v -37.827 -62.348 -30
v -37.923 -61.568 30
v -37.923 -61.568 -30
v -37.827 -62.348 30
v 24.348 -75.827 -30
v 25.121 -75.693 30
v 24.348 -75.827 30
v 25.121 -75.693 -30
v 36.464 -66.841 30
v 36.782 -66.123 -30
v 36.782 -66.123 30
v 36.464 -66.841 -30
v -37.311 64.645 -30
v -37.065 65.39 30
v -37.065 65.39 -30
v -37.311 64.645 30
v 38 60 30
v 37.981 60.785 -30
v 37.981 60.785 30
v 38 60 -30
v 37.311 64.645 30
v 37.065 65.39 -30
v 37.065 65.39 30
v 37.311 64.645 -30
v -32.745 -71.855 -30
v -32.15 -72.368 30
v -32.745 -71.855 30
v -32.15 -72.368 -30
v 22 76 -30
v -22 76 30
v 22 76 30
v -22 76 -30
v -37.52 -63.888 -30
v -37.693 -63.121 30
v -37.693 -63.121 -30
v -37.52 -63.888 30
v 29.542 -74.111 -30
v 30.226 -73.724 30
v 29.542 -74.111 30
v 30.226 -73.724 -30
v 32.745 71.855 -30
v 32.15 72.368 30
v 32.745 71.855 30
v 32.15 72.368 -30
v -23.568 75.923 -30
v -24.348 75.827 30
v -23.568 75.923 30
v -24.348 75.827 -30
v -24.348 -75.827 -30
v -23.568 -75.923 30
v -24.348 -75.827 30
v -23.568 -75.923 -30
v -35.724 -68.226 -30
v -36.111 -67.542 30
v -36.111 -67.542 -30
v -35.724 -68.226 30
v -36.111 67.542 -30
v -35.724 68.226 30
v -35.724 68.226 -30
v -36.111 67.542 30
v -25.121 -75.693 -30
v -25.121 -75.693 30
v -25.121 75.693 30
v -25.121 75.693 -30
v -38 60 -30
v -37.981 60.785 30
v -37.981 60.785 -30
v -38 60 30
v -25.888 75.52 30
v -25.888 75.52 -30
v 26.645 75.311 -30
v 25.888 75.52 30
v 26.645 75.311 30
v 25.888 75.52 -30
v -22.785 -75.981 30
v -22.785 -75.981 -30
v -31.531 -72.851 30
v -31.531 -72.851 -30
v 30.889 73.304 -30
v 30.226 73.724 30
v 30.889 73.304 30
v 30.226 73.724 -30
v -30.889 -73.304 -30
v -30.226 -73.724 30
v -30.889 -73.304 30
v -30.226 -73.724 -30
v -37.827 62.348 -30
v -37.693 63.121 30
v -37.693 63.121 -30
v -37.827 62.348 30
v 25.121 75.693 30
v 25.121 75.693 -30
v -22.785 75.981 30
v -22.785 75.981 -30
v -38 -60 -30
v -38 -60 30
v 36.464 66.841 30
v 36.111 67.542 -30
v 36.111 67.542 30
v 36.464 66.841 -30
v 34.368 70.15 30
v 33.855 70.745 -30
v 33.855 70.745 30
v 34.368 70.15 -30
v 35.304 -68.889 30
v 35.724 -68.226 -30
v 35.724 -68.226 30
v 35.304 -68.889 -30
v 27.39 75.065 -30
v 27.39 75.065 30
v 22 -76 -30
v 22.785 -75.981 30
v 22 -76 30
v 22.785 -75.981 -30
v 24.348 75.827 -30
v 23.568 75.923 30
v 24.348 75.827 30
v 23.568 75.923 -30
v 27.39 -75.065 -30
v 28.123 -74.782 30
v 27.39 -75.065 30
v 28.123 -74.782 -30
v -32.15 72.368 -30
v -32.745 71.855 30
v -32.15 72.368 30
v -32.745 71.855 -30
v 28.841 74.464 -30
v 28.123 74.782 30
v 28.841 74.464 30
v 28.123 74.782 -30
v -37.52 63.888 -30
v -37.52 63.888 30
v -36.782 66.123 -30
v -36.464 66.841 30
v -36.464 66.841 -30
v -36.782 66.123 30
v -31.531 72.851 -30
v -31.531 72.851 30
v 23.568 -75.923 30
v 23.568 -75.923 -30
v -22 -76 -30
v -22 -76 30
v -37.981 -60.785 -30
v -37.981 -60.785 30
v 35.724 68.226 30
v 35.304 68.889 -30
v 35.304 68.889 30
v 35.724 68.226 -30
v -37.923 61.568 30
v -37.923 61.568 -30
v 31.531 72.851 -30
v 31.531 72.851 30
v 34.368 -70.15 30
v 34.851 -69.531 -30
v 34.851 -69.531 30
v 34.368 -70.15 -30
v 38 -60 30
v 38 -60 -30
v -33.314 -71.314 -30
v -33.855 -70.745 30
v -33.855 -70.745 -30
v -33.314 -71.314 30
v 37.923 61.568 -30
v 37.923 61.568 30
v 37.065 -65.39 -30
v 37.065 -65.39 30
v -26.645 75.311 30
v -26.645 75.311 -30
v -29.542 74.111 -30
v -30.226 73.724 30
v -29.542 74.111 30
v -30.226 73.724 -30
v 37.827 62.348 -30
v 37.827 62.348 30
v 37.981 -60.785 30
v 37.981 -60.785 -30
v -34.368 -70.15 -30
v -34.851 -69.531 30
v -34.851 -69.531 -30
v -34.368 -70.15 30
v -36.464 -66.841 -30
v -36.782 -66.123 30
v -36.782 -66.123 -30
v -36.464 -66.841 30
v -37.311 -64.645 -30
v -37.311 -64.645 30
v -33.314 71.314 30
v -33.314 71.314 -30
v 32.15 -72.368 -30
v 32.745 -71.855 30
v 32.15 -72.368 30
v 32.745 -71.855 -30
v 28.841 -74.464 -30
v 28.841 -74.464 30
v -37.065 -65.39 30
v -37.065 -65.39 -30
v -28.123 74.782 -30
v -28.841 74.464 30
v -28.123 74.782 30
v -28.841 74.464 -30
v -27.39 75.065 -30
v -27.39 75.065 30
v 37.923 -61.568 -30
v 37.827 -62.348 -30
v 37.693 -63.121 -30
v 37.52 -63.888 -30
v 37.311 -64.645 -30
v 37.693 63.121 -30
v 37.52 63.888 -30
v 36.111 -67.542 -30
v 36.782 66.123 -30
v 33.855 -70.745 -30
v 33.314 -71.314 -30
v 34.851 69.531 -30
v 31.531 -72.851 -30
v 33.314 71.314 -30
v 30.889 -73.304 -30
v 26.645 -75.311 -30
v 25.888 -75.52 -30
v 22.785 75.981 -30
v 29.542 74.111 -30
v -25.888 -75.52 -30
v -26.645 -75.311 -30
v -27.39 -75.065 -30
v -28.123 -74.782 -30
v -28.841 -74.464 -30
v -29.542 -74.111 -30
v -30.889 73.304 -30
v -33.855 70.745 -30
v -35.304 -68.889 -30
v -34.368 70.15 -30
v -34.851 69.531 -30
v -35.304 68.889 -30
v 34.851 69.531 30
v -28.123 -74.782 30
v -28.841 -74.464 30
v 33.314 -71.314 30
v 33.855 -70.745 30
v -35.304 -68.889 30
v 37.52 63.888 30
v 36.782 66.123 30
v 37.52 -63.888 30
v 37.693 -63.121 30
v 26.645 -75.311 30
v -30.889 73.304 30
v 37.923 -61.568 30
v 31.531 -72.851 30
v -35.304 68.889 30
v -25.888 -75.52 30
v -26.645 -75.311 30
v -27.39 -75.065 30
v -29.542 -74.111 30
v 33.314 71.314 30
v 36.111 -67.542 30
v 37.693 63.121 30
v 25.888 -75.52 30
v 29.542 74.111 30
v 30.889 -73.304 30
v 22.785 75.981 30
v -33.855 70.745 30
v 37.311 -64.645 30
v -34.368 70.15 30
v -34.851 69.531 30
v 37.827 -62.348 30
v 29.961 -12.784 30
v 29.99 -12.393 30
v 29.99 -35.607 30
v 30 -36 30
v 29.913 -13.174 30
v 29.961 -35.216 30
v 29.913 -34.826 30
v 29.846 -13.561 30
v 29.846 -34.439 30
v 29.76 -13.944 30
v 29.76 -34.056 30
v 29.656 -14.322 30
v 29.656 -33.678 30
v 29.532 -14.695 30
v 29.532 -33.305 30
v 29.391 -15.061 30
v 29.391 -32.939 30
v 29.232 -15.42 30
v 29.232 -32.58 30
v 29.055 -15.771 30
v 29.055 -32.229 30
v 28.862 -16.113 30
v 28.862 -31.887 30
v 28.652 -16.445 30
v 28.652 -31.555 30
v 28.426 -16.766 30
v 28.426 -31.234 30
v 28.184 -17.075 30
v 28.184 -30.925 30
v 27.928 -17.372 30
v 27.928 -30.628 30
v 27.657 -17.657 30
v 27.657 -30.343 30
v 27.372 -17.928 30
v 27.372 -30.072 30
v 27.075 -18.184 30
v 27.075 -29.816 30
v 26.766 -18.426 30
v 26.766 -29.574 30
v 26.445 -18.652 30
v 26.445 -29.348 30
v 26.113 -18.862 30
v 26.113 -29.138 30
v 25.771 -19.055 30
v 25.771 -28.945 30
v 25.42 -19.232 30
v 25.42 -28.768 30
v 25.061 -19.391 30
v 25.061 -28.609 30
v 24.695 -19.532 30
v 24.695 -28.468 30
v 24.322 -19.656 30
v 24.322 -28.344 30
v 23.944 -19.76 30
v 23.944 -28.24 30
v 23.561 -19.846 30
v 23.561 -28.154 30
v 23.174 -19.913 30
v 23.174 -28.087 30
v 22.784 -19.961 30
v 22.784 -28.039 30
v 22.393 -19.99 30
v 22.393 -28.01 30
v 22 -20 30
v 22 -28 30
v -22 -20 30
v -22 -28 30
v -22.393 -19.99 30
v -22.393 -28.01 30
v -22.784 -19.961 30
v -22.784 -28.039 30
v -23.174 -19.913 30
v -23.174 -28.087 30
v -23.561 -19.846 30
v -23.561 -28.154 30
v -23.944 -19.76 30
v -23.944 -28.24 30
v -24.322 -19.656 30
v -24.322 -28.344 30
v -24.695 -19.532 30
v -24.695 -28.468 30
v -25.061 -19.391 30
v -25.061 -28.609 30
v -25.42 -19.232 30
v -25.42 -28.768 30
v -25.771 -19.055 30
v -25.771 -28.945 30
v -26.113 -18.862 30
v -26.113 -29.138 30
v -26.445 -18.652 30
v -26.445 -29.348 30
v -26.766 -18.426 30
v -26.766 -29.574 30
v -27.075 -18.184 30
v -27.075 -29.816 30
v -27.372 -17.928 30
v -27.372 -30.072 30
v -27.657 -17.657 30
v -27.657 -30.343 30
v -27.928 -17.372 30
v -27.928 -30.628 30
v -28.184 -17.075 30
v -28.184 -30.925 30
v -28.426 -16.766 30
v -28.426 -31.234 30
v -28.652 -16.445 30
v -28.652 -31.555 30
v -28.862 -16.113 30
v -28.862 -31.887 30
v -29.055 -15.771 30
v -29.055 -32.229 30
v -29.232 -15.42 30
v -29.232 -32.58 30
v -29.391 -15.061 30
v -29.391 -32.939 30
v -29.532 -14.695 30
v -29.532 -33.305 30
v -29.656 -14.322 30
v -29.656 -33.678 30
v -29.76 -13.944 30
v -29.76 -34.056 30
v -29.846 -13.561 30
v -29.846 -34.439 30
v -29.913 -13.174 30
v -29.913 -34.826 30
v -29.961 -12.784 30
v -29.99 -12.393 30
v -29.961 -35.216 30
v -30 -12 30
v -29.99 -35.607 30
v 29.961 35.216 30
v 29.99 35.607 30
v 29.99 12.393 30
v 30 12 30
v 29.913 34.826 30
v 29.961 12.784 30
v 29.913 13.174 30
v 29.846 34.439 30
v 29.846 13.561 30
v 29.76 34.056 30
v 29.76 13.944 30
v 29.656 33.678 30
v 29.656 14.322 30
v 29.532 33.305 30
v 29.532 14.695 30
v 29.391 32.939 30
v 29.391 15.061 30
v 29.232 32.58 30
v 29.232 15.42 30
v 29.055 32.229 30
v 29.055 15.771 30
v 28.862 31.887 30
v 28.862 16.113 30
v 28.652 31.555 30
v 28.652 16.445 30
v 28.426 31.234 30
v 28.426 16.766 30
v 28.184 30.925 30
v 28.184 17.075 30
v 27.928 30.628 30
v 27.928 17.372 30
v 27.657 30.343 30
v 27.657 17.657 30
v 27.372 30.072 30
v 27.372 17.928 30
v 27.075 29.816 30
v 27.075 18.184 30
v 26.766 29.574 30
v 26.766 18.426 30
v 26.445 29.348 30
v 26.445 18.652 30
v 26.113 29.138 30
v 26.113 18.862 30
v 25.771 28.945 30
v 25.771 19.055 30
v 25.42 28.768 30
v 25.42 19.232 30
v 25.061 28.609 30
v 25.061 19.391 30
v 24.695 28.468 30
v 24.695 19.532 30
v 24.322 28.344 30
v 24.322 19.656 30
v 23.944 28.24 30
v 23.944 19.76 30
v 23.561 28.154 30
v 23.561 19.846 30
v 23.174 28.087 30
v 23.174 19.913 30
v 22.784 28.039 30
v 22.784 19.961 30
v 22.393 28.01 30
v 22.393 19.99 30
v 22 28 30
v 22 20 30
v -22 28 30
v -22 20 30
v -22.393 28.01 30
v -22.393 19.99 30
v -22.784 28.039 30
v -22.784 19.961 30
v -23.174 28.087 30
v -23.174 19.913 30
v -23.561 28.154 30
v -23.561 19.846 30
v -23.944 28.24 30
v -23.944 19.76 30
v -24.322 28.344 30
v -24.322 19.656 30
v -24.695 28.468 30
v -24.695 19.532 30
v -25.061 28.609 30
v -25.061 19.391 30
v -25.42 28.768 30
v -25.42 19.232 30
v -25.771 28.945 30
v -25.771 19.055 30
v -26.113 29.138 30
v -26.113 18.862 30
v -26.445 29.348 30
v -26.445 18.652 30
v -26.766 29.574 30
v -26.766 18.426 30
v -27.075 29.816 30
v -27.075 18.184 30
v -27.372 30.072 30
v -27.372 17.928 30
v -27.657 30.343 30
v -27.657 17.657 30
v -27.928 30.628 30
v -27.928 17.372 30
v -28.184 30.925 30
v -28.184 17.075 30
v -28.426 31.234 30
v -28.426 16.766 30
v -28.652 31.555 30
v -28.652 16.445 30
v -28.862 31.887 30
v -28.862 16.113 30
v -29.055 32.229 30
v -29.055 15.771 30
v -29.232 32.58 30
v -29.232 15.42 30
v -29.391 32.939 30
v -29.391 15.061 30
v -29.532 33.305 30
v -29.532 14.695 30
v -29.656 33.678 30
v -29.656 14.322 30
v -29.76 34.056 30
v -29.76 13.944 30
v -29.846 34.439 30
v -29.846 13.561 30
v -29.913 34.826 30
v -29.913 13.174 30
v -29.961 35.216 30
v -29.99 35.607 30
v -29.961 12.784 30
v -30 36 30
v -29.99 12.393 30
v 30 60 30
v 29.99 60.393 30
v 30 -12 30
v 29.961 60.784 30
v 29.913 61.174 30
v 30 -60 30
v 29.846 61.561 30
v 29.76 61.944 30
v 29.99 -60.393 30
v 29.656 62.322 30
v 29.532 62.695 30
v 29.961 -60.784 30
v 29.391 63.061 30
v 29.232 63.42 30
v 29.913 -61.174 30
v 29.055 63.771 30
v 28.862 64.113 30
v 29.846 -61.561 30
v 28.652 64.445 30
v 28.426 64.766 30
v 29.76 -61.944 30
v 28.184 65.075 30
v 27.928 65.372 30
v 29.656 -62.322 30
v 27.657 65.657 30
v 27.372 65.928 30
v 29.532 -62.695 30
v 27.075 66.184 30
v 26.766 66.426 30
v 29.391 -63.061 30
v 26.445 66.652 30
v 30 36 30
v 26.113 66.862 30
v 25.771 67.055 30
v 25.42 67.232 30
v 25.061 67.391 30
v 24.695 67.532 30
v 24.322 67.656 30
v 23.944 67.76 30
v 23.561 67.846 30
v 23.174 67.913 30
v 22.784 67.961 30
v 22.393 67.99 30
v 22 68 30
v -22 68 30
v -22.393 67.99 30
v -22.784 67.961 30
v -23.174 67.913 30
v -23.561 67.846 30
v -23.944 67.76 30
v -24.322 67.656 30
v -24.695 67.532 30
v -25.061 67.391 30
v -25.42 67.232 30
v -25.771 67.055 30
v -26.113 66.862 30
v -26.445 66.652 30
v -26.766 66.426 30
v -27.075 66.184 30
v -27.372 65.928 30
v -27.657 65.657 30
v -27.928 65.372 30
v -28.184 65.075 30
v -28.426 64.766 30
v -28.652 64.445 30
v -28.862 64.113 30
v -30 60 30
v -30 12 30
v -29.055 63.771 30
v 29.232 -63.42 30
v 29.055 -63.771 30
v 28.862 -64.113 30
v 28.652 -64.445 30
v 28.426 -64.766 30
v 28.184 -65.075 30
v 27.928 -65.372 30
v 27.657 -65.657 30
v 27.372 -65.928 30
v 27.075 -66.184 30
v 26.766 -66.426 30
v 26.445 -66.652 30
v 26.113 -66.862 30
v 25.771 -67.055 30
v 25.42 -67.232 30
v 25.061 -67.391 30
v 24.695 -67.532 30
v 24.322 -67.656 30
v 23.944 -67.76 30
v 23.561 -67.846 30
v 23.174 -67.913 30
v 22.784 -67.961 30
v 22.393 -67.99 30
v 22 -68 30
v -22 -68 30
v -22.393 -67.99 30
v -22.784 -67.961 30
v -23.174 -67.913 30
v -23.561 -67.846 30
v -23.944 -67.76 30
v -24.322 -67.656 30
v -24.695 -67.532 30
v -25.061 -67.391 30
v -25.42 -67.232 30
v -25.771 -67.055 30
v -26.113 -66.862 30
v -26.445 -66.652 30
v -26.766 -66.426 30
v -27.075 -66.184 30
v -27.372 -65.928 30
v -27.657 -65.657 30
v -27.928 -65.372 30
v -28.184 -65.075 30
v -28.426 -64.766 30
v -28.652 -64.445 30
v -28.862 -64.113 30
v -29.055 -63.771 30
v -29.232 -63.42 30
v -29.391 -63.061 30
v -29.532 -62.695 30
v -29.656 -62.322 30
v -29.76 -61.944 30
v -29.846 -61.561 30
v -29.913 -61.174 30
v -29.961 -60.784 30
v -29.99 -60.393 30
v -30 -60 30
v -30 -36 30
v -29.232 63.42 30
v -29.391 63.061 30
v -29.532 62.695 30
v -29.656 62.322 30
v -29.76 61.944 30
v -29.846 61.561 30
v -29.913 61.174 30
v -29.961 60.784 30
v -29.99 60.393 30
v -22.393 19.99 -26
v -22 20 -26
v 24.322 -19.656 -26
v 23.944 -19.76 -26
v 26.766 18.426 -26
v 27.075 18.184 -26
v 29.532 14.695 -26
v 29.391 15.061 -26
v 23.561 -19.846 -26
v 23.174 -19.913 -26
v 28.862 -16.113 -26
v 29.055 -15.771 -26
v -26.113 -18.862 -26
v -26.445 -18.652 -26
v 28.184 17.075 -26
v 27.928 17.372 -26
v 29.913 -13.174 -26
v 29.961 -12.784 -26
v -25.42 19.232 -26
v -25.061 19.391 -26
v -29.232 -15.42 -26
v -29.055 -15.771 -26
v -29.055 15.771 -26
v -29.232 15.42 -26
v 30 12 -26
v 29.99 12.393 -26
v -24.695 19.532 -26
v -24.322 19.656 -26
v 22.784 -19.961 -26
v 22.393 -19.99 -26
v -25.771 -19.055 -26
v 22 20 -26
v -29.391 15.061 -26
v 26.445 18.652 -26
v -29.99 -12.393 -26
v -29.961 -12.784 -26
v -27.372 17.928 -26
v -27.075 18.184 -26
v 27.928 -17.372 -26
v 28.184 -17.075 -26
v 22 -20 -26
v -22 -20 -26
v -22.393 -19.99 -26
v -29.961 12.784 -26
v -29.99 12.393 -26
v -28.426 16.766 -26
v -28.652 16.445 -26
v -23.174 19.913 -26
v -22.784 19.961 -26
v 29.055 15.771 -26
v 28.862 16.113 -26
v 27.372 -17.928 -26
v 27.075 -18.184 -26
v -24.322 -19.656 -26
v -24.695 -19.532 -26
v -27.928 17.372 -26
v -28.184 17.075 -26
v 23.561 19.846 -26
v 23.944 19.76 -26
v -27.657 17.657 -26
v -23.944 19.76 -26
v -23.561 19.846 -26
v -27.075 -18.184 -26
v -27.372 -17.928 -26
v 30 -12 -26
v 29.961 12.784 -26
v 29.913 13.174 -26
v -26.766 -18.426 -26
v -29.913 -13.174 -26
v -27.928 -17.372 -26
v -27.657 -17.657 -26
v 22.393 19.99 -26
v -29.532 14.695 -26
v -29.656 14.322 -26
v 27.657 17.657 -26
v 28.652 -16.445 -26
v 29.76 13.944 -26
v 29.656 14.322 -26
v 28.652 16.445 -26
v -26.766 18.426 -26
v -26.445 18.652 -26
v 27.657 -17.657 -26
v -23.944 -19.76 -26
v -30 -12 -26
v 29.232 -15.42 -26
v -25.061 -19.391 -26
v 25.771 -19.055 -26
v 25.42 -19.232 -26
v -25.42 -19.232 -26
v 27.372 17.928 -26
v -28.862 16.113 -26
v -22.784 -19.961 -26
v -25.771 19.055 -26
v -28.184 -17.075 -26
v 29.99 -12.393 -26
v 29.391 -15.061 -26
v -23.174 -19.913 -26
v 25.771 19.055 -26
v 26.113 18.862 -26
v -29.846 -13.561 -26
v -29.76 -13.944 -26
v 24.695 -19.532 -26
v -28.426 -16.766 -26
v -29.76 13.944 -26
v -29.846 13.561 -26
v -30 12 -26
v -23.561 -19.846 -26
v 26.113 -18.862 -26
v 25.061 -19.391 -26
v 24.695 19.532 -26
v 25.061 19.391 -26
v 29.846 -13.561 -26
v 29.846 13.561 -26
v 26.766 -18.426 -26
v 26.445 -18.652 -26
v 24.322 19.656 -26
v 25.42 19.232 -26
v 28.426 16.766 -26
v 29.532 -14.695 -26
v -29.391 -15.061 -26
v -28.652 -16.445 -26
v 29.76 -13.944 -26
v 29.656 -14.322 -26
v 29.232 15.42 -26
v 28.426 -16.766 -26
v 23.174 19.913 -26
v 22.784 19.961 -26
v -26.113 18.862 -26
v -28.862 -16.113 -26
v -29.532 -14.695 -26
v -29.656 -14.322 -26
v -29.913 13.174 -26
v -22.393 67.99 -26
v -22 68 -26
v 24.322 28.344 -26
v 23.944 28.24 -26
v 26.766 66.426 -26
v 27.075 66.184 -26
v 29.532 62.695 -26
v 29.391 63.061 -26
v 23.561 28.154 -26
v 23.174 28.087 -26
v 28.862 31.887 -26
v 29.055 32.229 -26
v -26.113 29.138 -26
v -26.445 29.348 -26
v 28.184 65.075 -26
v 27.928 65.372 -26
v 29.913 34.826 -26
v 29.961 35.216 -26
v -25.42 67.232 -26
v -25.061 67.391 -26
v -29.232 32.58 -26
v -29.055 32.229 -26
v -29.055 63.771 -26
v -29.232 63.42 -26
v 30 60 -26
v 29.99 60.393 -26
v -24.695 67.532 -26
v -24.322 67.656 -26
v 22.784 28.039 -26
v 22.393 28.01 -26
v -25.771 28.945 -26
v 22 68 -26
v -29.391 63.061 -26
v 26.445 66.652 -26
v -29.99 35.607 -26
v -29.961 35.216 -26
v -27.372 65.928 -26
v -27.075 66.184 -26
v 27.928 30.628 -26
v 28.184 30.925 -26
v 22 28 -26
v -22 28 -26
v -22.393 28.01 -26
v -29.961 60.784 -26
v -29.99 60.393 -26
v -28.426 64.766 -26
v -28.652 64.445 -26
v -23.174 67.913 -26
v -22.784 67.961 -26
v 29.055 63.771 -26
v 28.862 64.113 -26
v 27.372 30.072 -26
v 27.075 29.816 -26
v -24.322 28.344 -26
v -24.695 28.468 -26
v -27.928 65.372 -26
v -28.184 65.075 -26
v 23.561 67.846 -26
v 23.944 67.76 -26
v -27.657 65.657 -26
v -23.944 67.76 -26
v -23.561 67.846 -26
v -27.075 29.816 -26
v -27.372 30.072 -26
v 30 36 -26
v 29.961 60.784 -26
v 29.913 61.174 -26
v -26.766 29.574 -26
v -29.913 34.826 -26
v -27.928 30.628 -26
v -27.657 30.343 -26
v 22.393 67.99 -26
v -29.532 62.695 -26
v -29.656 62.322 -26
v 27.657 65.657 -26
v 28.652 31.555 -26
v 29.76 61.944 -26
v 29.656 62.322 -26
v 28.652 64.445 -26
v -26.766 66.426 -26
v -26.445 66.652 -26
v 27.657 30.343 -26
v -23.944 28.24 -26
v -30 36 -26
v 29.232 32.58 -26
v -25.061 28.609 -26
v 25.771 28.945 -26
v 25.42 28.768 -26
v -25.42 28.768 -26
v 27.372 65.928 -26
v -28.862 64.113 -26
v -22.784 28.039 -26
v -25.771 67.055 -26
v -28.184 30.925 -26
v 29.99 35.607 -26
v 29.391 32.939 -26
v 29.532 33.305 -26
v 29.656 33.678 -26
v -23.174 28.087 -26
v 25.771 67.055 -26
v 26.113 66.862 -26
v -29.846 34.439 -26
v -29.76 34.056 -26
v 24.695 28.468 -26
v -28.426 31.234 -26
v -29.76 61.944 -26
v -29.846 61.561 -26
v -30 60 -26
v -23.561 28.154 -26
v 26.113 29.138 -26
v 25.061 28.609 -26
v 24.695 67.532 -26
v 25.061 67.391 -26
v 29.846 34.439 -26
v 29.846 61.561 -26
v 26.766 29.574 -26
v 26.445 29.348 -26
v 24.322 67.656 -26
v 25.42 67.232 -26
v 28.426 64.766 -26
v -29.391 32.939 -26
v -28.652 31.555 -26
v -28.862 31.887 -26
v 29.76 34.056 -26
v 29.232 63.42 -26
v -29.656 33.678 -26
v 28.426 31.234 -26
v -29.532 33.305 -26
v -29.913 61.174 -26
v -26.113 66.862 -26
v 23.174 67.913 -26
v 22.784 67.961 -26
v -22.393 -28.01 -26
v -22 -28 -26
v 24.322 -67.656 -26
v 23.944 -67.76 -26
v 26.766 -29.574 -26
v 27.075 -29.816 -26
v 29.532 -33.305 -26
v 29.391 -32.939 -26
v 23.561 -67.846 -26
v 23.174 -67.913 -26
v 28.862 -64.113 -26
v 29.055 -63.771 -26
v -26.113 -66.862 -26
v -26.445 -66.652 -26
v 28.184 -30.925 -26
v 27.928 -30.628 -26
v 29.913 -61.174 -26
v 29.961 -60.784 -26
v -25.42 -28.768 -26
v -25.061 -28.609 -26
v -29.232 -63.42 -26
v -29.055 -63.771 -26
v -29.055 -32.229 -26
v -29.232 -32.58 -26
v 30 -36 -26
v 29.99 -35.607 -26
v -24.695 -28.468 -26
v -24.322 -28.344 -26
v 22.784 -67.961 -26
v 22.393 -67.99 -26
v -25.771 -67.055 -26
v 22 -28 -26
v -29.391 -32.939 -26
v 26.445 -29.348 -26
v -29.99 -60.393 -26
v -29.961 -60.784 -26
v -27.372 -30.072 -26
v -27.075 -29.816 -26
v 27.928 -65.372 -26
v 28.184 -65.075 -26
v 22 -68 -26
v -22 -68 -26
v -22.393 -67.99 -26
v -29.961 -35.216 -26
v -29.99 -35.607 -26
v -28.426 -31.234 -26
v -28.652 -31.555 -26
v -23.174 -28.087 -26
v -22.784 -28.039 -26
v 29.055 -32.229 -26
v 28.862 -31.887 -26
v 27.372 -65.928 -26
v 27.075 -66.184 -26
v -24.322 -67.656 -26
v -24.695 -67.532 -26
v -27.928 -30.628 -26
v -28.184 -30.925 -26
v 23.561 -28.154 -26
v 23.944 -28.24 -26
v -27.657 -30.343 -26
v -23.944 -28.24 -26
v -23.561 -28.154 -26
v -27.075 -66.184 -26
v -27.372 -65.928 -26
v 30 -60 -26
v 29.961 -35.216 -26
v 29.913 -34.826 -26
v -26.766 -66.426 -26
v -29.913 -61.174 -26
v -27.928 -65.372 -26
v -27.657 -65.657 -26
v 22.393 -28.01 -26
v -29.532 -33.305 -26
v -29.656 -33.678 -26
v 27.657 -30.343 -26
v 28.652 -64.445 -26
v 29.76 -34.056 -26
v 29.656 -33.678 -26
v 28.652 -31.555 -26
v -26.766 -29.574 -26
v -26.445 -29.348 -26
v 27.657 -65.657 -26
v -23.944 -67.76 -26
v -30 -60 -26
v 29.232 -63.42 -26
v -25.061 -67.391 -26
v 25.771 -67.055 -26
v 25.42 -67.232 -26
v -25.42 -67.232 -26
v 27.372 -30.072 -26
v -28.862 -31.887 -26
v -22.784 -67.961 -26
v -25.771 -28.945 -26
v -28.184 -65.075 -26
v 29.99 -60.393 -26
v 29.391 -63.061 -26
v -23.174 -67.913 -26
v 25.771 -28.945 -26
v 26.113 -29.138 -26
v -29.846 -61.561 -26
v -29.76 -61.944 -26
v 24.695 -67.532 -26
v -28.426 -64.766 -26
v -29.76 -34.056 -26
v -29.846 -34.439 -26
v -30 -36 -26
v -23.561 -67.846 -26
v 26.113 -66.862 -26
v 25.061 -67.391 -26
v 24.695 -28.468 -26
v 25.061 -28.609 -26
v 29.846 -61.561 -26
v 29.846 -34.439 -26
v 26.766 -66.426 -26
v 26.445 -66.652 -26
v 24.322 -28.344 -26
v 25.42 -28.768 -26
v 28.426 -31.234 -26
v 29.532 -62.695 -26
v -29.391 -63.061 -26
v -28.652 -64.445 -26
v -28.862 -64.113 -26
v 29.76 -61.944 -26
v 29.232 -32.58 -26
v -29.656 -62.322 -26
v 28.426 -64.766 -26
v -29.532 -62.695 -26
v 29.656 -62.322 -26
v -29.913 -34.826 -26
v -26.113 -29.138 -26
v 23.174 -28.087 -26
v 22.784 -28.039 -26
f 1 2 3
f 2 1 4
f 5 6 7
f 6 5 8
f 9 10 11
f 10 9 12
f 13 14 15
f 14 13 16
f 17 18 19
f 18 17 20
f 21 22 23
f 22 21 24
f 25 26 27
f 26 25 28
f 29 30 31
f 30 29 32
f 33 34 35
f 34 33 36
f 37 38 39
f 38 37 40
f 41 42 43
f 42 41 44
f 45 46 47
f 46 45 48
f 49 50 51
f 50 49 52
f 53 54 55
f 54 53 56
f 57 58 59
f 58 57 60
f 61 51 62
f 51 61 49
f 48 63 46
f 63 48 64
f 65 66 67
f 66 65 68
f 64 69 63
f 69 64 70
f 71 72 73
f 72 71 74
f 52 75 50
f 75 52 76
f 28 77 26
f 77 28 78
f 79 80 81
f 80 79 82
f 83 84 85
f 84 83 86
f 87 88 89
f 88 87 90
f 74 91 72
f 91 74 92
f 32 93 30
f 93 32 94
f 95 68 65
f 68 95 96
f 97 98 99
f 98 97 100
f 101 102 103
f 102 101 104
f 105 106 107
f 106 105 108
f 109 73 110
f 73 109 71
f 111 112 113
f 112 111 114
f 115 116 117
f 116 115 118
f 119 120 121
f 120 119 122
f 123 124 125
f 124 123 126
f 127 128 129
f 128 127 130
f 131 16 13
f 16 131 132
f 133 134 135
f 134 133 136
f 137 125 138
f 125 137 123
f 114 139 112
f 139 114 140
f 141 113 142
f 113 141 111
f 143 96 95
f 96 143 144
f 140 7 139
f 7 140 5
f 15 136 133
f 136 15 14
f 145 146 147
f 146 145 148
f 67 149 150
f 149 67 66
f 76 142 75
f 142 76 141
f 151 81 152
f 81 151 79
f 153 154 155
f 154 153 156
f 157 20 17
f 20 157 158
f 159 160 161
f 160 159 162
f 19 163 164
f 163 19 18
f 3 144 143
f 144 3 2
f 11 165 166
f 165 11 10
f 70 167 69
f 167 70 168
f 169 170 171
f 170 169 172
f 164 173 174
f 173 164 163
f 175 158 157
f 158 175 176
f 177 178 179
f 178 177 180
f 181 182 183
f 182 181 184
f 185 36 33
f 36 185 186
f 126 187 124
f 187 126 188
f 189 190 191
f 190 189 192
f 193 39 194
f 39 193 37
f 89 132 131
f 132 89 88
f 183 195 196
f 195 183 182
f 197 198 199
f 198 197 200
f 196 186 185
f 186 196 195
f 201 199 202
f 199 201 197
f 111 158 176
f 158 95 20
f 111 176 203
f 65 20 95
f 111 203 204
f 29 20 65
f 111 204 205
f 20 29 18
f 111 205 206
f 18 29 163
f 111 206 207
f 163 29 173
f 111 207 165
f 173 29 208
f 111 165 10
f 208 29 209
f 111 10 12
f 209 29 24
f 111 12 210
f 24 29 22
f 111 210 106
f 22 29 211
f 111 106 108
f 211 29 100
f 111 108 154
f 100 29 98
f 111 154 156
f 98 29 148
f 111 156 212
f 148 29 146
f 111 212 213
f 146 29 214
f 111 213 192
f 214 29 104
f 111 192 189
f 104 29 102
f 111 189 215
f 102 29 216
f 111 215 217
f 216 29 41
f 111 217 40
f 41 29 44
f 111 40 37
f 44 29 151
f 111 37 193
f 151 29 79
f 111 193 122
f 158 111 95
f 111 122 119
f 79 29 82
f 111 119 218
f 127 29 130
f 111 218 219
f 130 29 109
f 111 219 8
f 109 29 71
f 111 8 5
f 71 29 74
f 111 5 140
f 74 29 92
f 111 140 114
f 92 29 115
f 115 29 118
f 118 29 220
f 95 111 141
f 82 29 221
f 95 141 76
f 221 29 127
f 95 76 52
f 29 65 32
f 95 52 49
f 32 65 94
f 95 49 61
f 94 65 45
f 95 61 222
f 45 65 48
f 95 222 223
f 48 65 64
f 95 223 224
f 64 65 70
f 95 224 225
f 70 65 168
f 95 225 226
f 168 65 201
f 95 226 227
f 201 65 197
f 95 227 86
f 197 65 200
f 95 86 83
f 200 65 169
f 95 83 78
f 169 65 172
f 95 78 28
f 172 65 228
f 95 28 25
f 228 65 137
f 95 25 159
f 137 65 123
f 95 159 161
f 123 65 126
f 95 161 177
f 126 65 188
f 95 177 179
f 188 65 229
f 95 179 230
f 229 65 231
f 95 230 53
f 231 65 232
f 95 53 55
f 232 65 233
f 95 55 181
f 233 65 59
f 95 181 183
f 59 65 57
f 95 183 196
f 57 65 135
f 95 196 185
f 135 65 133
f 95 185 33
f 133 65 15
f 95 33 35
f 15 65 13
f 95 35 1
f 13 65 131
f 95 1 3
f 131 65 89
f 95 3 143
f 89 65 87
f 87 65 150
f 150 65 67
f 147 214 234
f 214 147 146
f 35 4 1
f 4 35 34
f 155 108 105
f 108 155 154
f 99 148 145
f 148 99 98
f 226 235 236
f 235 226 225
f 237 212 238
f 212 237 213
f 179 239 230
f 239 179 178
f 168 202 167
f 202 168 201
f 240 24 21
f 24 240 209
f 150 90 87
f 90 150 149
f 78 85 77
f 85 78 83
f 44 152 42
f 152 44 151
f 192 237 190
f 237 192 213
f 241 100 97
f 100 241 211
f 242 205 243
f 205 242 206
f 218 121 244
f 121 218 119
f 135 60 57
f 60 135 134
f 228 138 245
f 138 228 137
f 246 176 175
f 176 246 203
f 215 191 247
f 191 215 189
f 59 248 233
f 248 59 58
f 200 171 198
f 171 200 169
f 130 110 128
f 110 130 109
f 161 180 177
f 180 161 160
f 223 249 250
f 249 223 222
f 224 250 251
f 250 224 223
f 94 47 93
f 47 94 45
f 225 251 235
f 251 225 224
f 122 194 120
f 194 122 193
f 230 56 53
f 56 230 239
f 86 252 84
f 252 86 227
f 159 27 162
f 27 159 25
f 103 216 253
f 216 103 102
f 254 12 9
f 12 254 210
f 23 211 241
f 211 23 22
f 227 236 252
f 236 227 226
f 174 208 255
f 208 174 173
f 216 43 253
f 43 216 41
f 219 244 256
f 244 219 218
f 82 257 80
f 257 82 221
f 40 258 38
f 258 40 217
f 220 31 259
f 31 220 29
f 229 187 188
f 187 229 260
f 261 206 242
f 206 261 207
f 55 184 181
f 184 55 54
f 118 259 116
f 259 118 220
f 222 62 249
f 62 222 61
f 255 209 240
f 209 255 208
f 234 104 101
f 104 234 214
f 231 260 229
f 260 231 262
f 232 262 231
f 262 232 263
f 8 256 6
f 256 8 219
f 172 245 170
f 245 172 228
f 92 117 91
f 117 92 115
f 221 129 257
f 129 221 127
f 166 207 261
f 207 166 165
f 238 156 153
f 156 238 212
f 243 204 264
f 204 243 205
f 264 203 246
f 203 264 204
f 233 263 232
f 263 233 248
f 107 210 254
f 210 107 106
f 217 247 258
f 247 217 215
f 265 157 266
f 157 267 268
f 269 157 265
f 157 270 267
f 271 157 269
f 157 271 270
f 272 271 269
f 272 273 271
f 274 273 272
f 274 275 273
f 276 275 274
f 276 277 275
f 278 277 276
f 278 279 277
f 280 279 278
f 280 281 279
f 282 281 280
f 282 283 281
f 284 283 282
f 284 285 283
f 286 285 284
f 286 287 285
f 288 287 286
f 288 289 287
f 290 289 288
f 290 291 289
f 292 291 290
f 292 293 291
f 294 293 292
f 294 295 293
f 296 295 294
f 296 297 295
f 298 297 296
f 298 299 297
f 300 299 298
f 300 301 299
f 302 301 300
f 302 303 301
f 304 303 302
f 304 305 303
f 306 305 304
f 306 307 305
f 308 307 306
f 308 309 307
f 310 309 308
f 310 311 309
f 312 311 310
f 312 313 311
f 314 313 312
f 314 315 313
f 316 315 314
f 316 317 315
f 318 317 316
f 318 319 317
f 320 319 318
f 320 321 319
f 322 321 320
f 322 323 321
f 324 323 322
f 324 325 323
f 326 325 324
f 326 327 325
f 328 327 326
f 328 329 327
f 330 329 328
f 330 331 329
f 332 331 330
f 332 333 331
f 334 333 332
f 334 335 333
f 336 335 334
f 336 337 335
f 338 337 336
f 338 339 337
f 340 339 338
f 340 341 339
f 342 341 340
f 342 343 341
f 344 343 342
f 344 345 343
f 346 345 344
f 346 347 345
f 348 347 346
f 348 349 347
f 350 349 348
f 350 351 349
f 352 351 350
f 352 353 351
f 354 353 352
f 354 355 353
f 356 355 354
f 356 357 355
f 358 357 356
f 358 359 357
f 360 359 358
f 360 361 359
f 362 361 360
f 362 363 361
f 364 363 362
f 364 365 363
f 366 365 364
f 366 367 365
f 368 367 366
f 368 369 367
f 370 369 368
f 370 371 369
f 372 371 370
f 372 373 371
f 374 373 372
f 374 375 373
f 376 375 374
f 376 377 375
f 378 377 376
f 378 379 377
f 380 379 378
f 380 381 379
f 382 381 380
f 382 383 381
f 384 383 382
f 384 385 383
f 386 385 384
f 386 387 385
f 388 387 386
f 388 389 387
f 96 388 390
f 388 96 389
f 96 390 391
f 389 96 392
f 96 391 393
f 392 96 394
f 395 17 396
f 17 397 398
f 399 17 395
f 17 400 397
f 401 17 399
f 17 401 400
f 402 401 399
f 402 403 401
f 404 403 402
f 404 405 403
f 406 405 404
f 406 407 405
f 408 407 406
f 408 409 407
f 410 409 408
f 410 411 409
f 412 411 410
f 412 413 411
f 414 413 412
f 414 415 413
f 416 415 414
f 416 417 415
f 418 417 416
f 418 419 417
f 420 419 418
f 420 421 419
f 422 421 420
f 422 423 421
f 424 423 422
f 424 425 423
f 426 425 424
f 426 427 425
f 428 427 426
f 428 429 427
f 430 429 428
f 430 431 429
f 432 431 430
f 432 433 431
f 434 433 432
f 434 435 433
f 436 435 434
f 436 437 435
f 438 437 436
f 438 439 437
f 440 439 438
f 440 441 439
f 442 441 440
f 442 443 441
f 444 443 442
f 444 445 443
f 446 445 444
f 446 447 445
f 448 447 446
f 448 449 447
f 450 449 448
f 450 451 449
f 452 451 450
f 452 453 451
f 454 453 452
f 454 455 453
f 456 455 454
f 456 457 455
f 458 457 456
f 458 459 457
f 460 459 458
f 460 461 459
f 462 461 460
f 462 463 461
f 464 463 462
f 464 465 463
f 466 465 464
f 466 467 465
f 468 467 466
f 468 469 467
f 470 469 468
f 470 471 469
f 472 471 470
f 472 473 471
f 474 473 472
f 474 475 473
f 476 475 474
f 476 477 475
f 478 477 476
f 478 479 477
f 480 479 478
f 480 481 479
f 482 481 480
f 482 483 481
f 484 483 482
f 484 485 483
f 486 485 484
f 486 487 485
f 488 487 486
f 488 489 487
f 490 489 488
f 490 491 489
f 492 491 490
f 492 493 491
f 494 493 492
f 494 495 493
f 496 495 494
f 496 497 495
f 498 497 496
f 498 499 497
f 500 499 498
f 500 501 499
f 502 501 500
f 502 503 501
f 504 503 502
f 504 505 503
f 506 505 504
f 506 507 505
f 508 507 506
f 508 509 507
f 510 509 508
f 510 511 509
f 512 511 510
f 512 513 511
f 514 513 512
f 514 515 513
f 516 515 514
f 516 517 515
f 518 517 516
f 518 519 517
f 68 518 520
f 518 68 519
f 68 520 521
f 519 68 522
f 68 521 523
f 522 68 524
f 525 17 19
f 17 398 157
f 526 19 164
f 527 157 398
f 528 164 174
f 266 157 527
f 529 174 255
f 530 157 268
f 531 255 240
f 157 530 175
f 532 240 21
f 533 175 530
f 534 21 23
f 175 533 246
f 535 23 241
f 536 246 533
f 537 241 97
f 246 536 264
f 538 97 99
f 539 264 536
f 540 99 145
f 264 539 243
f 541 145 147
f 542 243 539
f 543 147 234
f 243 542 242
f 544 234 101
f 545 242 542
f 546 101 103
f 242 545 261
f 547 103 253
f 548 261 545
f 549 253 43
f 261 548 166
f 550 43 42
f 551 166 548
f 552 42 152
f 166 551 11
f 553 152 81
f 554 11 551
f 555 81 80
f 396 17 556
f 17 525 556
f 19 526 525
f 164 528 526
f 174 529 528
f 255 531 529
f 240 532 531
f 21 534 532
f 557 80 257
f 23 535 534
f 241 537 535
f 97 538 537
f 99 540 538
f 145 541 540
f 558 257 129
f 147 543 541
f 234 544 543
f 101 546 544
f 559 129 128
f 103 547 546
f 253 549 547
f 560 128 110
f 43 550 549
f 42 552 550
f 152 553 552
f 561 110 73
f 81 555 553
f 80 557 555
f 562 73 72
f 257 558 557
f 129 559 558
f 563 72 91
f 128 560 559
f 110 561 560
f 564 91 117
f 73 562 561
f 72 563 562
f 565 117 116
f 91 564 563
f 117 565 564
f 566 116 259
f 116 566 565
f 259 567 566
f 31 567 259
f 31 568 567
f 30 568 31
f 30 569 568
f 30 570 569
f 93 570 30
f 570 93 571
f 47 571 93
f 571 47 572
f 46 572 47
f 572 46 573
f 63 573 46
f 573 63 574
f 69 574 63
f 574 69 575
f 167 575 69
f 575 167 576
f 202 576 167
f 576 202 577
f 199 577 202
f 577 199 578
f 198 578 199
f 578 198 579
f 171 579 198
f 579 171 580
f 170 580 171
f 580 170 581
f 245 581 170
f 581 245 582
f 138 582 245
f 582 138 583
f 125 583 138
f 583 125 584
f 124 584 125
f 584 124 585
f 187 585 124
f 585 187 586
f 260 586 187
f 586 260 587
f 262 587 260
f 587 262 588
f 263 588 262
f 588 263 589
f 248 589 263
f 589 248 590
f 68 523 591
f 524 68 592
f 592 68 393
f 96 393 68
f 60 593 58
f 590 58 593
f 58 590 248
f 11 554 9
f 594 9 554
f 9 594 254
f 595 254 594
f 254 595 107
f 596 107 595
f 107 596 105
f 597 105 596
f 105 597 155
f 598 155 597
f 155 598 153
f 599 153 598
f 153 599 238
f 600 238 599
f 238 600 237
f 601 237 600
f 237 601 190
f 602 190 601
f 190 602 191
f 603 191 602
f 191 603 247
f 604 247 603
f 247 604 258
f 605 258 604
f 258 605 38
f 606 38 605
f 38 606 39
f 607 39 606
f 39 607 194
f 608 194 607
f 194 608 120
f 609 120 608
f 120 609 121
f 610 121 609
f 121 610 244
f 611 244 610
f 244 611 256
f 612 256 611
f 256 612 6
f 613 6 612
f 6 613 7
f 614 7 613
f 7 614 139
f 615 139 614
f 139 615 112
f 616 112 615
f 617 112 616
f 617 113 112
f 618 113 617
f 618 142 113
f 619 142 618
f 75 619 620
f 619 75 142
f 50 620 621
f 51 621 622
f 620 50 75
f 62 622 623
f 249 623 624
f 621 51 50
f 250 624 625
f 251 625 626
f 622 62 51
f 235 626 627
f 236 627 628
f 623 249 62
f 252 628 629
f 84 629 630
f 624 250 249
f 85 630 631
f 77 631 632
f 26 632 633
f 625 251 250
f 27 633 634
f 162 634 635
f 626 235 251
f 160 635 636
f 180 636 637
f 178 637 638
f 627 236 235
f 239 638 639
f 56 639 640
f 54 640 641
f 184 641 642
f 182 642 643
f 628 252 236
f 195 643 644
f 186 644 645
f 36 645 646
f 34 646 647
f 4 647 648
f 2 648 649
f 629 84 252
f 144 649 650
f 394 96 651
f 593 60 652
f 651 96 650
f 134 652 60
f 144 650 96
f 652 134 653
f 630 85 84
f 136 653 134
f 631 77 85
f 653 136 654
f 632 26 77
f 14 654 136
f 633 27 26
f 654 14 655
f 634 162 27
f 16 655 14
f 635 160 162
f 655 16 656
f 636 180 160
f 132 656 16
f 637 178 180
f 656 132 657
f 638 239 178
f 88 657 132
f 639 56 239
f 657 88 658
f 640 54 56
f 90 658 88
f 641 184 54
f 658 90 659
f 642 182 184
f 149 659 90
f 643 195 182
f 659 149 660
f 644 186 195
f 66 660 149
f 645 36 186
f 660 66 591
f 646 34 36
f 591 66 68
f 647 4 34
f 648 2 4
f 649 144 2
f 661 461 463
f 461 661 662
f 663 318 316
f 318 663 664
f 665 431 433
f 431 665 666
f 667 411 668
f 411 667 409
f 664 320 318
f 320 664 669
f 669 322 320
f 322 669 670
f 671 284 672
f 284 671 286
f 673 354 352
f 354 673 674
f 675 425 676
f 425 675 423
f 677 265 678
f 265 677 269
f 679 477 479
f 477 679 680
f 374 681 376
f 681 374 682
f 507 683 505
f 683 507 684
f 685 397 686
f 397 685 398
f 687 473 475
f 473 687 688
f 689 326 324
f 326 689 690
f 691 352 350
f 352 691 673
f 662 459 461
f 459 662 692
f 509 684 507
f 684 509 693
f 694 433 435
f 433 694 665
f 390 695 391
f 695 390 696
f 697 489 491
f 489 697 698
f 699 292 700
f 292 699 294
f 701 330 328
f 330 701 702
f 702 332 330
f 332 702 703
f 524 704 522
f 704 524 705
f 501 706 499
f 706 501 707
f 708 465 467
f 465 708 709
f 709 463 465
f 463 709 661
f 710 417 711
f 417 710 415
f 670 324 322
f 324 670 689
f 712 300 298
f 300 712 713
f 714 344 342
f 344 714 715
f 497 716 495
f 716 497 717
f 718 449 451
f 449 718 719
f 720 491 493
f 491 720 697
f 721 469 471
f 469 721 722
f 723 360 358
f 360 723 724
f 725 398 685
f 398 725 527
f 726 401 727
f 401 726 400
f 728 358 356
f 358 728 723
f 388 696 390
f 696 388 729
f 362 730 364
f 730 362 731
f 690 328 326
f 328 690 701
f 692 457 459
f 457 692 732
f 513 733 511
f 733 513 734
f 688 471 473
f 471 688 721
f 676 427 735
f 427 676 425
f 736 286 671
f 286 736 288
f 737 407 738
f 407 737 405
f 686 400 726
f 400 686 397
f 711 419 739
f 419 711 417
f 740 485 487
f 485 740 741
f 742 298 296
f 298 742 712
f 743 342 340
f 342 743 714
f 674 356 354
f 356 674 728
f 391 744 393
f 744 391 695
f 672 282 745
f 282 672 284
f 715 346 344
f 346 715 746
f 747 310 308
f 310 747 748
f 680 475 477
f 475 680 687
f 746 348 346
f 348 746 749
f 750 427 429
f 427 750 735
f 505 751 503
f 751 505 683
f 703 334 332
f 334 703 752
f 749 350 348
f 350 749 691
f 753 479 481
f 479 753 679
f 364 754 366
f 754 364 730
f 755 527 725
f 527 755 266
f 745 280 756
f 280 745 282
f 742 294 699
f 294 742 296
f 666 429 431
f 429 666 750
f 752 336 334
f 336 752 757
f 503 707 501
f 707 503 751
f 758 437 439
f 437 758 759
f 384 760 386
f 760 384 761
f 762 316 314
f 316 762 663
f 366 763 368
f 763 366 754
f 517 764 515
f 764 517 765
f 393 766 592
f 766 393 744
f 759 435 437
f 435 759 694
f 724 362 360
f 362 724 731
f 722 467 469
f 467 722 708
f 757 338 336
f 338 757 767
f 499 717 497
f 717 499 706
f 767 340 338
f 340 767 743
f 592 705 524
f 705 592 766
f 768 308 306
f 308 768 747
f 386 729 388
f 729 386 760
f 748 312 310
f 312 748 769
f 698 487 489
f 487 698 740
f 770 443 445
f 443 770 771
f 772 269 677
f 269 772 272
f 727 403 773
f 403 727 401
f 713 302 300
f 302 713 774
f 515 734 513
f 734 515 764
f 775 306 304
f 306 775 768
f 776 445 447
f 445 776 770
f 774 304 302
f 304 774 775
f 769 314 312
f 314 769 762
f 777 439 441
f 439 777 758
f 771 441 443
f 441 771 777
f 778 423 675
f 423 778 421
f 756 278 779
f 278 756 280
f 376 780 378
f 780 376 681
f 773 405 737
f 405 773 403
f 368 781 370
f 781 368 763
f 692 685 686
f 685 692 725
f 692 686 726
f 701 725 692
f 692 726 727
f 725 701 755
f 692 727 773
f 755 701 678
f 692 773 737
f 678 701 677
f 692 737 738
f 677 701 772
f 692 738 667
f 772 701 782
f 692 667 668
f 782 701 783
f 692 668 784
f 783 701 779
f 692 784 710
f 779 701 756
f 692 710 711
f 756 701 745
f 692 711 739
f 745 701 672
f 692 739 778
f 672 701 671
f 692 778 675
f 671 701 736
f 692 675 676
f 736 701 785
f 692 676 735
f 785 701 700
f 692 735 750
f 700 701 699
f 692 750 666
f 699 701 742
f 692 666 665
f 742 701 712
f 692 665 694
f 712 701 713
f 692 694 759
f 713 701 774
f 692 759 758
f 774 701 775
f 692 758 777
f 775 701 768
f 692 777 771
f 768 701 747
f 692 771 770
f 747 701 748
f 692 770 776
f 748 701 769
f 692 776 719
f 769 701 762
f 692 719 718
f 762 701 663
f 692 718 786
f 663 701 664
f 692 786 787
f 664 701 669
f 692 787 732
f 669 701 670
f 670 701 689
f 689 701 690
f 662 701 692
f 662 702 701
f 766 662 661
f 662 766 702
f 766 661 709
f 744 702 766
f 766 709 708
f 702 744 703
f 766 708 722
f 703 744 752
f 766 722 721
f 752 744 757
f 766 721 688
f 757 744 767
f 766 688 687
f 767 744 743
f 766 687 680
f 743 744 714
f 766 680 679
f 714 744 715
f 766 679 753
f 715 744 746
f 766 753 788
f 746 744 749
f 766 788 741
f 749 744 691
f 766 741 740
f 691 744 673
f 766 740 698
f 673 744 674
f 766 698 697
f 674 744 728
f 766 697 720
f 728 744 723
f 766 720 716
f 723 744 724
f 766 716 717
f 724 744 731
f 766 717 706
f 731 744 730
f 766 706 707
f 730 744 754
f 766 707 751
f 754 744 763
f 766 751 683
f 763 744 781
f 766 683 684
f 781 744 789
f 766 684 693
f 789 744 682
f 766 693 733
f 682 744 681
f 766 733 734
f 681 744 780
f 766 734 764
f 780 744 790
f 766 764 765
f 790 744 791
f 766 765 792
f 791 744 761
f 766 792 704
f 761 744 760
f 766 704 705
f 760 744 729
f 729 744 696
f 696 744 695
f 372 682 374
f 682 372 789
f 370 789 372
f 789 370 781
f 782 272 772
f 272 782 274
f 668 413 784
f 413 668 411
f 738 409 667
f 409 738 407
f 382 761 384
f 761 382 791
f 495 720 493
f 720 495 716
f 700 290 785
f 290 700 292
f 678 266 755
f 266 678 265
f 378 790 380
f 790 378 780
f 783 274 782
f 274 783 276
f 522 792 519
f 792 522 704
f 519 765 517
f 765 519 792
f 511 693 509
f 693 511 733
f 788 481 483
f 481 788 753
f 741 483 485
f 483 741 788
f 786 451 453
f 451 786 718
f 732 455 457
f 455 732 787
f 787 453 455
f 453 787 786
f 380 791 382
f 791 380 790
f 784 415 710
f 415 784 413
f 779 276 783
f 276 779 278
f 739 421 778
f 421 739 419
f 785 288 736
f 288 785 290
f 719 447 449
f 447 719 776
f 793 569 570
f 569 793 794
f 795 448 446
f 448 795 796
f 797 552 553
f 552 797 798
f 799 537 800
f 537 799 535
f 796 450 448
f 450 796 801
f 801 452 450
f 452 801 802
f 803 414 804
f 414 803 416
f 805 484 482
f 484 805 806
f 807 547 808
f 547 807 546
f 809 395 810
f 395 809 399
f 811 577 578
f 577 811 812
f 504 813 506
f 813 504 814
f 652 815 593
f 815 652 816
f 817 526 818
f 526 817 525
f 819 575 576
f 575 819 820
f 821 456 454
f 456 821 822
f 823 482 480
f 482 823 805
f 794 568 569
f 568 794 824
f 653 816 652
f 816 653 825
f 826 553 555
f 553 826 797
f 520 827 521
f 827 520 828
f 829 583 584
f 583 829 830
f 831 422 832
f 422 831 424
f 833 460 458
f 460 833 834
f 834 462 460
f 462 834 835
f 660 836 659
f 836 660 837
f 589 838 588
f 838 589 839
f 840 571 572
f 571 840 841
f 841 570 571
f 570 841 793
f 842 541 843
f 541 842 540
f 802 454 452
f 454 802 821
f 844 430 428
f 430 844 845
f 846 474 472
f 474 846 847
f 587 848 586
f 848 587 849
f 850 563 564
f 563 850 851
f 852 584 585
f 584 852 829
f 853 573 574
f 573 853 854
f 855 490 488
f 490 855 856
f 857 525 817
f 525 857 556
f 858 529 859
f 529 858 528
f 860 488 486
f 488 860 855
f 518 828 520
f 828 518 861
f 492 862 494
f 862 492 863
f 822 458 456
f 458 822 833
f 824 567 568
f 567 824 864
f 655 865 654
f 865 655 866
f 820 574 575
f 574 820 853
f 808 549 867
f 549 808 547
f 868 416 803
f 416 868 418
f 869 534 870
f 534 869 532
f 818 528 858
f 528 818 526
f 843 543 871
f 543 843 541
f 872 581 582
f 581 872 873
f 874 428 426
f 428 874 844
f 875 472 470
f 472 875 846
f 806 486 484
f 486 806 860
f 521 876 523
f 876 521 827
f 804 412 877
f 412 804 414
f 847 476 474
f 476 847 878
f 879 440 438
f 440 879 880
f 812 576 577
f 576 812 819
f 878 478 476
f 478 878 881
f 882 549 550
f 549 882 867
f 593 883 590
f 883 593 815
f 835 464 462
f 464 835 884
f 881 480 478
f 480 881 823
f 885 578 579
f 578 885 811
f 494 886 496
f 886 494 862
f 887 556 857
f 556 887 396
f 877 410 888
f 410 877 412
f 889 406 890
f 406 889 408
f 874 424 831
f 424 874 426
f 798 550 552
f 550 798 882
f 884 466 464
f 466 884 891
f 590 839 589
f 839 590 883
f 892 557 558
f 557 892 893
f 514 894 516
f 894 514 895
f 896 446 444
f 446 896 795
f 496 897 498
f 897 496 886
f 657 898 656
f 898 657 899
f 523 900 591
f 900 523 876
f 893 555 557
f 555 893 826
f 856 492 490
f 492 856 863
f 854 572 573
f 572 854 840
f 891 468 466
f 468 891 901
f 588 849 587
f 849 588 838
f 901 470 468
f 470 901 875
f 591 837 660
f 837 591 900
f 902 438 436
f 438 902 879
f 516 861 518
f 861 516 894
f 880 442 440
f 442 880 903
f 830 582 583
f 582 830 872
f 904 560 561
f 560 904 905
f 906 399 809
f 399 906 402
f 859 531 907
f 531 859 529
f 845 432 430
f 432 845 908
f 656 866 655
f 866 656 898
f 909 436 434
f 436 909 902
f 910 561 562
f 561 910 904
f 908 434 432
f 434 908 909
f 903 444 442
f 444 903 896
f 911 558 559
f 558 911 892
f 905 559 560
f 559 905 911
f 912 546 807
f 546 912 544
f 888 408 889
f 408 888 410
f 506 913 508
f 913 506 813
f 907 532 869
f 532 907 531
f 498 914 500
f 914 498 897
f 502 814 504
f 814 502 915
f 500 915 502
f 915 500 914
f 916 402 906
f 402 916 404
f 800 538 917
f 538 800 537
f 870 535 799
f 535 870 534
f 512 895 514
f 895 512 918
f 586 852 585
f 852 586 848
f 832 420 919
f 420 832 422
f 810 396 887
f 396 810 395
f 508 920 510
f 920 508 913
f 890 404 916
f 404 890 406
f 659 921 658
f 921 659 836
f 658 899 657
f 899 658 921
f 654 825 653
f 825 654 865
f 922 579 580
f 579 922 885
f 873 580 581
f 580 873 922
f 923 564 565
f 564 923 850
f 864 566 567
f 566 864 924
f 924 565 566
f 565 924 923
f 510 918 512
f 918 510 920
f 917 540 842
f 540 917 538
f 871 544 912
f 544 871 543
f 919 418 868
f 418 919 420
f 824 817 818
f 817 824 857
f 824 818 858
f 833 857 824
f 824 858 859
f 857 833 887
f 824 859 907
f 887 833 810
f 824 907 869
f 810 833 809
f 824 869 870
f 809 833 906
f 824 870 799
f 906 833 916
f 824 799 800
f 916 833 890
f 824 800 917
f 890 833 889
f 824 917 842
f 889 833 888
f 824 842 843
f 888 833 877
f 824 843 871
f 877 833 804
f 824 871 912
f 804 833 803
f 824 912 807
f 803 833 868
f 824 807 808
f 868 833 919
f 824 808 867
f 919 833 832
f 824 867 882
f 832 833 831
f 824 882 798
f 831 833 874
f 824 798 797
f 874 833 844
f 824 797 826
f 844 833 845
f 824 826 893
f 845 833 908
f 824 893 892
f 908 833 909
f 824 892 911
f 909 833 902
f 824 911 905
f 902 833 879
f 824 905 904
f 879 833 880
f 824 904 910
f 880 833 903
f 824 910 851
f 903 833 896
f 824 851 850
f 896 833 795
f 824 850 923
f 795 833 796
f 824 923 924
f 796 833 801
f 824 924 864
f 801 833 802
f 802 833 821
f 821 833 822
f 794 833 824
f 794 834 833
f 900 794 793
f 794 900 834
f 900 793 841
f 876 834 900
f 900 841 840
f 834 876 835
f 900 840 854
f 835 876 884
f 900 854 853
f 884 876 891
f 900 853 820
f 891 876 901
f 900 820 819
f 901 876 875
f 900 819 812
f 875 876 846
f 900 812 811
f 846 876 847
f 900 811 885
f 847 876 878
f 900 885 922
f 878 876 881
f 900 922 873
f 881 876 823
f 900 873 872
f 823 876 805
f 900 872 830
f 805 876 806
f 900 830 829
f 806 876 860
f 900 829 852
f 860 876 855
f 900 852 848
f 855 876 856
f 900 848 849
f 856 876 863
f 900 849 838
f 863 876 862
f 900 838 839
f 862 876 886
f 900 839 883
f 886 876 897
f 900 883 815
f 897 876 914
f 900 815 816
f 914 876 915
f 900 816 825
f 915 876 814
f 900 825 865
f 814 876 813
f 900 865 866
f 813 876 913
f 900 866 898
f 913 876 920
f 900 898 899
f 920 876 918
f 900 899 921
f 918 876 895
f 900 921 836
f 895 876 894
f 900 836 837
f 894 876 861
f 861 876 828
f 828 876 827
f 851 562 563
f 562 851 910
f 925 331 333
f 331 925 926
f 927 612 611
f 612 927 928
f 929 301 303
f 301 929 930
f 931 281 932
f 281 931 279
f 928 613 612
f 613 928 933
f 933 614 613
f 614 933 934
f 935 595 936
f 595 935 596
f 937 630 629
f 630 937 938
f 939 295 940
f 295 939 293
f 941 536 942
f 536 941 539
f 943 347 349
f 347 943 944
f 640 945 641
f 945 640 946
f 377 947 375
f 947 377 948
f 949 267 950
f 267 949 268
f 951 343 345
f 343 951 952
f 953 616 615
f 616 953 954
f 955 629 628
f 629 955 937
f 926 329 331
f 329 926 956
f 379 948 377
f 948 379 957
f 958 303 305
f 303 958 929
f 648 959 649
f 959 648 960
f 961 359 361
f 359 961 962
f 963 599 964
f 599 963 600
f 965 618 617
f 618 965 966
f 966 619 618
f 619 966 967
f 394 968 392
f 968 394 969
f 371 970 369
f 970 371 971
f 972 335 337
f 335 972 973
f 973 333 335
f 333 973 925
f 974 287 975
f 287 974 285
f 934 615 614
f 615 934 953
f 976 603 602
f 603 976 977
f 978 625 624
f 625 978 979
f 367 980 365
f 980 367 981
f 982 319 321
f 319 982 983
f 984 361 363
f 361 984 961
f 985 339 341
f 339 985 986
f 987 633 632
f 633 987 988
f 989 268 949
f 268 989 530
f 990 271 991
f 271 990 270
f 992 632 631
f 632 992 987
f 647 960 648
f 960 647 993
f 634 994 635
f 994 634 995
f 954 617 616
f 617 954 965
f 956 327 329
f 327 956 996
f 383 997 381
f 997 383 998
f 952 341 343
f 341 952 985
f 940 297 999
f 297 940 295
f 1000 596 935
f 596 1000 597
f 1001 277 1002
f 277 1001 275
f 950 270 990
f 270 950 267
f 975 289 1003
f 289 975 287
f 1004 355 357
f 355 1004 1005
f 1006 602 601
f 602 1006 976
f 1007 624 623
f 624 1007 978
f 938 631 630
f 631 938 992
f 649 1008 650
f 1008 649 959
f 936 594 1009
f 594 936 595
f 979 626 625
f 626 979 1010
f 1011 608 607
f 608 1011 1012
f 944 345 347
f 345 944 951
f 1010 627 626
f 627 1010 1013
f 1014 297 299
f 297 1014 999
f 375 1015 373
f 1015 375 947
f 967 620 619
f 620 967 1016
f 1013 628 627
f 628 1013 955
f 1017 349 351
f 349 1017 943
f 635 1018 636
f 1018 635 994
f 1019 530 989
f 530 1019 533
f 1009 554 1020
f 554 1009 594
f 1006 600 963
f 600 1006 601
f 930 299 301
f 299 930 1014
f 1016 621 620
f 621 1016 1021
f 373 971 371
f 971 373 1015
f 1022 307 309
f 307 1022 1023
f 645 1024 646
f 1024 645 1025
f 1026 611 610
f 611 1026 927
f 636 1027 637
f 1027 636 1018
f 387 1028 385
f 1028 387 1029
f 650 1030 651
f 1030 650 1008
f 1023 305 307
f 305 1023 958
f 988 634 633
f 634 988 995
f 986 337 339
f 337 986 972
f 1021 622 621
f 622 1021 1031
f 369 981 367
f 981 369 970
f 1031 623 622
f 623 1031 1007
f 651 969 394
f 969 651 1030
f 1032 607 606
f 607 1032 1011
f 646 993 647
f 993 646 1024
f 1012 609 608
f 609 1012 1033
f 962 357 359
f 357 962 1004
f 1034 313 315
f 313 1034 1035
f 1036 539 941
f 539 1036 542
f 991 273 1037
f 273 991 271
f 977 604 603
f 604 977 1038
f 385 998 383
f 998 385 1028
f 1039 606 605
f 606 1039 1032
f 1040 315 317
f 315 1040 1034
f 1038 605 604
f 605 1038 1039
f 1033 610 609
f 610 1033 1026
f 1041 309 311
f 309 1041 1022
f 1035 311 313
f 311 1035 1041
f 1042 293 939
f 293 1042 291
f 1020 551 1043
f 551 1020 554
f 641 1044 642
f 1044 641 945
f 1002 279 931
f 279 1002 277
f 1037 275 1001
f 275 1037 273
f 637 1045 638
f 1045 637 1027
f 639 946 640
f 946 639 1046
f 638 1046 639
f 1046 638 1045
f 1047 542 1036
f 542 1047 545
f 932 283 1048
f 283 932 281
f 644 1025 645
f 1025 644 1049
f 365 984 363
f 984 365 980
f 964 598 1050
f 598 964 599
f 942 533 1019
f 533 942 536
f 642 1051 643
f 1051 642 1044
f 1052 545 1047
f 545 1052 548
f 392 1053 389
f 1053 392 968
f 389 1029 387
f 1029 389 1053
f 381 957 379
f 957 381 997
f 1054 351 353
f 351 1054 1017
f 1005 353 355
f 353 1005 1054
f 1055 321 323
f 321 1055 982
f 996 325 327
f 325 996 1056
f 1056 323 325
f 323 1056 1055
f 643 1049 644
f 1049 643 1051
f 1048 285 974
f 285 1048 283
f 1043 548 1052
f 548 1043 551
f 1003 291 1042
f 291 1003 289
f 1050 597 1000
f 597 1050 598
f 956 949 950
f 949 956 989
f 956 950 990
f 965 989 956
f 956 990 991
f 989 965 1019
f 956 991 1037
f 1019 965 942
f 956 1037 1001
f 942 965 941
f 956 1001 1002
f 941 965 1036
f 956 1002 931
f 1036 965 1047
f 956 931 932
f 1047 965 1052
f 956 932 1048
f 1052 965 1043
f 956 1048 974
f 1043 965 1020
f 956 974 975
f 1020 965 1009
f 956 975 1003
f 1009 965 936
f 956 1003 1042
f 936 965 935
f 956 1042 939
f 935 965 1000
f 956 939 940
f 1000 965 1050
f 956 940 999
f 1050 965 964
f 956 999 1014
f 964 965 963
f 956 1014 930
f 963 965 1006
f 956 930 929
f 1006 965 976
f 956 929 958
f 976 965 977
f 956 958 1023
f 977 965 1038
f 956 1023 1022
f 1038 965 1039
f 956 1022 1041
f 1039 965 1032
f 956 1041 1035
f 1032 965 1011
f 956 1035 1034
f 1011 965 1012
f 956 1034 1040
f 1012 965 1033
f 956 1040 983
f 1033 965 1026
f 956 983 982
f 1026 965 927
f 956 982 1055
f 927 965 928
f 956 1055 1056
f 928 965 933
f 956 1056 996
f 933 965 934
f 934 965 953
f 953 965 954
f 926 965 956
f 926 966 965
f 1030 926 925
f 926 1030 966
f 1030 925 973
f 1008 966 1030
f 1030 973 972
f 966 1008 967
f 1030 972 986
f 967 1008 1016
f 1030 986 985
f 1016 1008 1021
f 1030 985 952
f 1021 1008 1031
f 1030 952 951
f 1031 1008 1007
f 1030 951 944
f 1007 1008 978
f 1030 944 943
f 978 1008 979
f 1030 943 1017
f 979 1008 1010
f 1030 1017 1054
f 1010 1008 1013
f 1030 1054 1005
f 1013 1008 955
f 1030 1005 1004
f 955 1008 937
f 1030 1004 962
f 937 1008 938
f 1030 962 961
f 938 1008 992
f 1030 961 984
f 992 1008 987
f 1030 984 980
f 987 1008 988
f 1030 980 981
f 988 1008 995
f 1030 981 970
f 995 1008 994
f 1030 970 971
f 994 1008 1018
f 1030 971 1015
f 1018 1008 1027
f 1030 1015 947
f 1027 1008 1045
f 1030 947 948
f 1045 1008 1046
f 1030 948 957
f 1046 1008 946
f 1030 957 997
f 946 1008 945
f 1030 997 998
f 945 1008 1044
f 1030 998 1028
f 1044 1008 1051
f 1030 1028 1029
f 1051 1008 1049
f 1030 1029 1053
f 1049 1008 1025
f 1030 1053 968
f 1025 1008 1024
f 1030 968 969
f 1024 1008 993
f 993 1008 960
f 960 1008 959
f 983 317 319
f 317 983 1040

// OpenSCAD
// 幅60, 高さ60, 奥行き40

fragments=128;

module block2(r, h, w, d) {
    linear_extrude(h, center=true, convexity=10) {
        offset(r, $fn=fragments)
        offset(-r, $fn=fragments)
        square([d, w], center=true);
    }
}

difference() {
    block2(16, 60, 152, 76);
    
    translate([0, 0, 4])
    block2(8, 60, 40, 60);
    
    translate([0, 48, 4])
    block2(8, 60, 40, 60);
    
    translate([0, -48, 4])
    block2(8, 60, 40, 60);
    
}
